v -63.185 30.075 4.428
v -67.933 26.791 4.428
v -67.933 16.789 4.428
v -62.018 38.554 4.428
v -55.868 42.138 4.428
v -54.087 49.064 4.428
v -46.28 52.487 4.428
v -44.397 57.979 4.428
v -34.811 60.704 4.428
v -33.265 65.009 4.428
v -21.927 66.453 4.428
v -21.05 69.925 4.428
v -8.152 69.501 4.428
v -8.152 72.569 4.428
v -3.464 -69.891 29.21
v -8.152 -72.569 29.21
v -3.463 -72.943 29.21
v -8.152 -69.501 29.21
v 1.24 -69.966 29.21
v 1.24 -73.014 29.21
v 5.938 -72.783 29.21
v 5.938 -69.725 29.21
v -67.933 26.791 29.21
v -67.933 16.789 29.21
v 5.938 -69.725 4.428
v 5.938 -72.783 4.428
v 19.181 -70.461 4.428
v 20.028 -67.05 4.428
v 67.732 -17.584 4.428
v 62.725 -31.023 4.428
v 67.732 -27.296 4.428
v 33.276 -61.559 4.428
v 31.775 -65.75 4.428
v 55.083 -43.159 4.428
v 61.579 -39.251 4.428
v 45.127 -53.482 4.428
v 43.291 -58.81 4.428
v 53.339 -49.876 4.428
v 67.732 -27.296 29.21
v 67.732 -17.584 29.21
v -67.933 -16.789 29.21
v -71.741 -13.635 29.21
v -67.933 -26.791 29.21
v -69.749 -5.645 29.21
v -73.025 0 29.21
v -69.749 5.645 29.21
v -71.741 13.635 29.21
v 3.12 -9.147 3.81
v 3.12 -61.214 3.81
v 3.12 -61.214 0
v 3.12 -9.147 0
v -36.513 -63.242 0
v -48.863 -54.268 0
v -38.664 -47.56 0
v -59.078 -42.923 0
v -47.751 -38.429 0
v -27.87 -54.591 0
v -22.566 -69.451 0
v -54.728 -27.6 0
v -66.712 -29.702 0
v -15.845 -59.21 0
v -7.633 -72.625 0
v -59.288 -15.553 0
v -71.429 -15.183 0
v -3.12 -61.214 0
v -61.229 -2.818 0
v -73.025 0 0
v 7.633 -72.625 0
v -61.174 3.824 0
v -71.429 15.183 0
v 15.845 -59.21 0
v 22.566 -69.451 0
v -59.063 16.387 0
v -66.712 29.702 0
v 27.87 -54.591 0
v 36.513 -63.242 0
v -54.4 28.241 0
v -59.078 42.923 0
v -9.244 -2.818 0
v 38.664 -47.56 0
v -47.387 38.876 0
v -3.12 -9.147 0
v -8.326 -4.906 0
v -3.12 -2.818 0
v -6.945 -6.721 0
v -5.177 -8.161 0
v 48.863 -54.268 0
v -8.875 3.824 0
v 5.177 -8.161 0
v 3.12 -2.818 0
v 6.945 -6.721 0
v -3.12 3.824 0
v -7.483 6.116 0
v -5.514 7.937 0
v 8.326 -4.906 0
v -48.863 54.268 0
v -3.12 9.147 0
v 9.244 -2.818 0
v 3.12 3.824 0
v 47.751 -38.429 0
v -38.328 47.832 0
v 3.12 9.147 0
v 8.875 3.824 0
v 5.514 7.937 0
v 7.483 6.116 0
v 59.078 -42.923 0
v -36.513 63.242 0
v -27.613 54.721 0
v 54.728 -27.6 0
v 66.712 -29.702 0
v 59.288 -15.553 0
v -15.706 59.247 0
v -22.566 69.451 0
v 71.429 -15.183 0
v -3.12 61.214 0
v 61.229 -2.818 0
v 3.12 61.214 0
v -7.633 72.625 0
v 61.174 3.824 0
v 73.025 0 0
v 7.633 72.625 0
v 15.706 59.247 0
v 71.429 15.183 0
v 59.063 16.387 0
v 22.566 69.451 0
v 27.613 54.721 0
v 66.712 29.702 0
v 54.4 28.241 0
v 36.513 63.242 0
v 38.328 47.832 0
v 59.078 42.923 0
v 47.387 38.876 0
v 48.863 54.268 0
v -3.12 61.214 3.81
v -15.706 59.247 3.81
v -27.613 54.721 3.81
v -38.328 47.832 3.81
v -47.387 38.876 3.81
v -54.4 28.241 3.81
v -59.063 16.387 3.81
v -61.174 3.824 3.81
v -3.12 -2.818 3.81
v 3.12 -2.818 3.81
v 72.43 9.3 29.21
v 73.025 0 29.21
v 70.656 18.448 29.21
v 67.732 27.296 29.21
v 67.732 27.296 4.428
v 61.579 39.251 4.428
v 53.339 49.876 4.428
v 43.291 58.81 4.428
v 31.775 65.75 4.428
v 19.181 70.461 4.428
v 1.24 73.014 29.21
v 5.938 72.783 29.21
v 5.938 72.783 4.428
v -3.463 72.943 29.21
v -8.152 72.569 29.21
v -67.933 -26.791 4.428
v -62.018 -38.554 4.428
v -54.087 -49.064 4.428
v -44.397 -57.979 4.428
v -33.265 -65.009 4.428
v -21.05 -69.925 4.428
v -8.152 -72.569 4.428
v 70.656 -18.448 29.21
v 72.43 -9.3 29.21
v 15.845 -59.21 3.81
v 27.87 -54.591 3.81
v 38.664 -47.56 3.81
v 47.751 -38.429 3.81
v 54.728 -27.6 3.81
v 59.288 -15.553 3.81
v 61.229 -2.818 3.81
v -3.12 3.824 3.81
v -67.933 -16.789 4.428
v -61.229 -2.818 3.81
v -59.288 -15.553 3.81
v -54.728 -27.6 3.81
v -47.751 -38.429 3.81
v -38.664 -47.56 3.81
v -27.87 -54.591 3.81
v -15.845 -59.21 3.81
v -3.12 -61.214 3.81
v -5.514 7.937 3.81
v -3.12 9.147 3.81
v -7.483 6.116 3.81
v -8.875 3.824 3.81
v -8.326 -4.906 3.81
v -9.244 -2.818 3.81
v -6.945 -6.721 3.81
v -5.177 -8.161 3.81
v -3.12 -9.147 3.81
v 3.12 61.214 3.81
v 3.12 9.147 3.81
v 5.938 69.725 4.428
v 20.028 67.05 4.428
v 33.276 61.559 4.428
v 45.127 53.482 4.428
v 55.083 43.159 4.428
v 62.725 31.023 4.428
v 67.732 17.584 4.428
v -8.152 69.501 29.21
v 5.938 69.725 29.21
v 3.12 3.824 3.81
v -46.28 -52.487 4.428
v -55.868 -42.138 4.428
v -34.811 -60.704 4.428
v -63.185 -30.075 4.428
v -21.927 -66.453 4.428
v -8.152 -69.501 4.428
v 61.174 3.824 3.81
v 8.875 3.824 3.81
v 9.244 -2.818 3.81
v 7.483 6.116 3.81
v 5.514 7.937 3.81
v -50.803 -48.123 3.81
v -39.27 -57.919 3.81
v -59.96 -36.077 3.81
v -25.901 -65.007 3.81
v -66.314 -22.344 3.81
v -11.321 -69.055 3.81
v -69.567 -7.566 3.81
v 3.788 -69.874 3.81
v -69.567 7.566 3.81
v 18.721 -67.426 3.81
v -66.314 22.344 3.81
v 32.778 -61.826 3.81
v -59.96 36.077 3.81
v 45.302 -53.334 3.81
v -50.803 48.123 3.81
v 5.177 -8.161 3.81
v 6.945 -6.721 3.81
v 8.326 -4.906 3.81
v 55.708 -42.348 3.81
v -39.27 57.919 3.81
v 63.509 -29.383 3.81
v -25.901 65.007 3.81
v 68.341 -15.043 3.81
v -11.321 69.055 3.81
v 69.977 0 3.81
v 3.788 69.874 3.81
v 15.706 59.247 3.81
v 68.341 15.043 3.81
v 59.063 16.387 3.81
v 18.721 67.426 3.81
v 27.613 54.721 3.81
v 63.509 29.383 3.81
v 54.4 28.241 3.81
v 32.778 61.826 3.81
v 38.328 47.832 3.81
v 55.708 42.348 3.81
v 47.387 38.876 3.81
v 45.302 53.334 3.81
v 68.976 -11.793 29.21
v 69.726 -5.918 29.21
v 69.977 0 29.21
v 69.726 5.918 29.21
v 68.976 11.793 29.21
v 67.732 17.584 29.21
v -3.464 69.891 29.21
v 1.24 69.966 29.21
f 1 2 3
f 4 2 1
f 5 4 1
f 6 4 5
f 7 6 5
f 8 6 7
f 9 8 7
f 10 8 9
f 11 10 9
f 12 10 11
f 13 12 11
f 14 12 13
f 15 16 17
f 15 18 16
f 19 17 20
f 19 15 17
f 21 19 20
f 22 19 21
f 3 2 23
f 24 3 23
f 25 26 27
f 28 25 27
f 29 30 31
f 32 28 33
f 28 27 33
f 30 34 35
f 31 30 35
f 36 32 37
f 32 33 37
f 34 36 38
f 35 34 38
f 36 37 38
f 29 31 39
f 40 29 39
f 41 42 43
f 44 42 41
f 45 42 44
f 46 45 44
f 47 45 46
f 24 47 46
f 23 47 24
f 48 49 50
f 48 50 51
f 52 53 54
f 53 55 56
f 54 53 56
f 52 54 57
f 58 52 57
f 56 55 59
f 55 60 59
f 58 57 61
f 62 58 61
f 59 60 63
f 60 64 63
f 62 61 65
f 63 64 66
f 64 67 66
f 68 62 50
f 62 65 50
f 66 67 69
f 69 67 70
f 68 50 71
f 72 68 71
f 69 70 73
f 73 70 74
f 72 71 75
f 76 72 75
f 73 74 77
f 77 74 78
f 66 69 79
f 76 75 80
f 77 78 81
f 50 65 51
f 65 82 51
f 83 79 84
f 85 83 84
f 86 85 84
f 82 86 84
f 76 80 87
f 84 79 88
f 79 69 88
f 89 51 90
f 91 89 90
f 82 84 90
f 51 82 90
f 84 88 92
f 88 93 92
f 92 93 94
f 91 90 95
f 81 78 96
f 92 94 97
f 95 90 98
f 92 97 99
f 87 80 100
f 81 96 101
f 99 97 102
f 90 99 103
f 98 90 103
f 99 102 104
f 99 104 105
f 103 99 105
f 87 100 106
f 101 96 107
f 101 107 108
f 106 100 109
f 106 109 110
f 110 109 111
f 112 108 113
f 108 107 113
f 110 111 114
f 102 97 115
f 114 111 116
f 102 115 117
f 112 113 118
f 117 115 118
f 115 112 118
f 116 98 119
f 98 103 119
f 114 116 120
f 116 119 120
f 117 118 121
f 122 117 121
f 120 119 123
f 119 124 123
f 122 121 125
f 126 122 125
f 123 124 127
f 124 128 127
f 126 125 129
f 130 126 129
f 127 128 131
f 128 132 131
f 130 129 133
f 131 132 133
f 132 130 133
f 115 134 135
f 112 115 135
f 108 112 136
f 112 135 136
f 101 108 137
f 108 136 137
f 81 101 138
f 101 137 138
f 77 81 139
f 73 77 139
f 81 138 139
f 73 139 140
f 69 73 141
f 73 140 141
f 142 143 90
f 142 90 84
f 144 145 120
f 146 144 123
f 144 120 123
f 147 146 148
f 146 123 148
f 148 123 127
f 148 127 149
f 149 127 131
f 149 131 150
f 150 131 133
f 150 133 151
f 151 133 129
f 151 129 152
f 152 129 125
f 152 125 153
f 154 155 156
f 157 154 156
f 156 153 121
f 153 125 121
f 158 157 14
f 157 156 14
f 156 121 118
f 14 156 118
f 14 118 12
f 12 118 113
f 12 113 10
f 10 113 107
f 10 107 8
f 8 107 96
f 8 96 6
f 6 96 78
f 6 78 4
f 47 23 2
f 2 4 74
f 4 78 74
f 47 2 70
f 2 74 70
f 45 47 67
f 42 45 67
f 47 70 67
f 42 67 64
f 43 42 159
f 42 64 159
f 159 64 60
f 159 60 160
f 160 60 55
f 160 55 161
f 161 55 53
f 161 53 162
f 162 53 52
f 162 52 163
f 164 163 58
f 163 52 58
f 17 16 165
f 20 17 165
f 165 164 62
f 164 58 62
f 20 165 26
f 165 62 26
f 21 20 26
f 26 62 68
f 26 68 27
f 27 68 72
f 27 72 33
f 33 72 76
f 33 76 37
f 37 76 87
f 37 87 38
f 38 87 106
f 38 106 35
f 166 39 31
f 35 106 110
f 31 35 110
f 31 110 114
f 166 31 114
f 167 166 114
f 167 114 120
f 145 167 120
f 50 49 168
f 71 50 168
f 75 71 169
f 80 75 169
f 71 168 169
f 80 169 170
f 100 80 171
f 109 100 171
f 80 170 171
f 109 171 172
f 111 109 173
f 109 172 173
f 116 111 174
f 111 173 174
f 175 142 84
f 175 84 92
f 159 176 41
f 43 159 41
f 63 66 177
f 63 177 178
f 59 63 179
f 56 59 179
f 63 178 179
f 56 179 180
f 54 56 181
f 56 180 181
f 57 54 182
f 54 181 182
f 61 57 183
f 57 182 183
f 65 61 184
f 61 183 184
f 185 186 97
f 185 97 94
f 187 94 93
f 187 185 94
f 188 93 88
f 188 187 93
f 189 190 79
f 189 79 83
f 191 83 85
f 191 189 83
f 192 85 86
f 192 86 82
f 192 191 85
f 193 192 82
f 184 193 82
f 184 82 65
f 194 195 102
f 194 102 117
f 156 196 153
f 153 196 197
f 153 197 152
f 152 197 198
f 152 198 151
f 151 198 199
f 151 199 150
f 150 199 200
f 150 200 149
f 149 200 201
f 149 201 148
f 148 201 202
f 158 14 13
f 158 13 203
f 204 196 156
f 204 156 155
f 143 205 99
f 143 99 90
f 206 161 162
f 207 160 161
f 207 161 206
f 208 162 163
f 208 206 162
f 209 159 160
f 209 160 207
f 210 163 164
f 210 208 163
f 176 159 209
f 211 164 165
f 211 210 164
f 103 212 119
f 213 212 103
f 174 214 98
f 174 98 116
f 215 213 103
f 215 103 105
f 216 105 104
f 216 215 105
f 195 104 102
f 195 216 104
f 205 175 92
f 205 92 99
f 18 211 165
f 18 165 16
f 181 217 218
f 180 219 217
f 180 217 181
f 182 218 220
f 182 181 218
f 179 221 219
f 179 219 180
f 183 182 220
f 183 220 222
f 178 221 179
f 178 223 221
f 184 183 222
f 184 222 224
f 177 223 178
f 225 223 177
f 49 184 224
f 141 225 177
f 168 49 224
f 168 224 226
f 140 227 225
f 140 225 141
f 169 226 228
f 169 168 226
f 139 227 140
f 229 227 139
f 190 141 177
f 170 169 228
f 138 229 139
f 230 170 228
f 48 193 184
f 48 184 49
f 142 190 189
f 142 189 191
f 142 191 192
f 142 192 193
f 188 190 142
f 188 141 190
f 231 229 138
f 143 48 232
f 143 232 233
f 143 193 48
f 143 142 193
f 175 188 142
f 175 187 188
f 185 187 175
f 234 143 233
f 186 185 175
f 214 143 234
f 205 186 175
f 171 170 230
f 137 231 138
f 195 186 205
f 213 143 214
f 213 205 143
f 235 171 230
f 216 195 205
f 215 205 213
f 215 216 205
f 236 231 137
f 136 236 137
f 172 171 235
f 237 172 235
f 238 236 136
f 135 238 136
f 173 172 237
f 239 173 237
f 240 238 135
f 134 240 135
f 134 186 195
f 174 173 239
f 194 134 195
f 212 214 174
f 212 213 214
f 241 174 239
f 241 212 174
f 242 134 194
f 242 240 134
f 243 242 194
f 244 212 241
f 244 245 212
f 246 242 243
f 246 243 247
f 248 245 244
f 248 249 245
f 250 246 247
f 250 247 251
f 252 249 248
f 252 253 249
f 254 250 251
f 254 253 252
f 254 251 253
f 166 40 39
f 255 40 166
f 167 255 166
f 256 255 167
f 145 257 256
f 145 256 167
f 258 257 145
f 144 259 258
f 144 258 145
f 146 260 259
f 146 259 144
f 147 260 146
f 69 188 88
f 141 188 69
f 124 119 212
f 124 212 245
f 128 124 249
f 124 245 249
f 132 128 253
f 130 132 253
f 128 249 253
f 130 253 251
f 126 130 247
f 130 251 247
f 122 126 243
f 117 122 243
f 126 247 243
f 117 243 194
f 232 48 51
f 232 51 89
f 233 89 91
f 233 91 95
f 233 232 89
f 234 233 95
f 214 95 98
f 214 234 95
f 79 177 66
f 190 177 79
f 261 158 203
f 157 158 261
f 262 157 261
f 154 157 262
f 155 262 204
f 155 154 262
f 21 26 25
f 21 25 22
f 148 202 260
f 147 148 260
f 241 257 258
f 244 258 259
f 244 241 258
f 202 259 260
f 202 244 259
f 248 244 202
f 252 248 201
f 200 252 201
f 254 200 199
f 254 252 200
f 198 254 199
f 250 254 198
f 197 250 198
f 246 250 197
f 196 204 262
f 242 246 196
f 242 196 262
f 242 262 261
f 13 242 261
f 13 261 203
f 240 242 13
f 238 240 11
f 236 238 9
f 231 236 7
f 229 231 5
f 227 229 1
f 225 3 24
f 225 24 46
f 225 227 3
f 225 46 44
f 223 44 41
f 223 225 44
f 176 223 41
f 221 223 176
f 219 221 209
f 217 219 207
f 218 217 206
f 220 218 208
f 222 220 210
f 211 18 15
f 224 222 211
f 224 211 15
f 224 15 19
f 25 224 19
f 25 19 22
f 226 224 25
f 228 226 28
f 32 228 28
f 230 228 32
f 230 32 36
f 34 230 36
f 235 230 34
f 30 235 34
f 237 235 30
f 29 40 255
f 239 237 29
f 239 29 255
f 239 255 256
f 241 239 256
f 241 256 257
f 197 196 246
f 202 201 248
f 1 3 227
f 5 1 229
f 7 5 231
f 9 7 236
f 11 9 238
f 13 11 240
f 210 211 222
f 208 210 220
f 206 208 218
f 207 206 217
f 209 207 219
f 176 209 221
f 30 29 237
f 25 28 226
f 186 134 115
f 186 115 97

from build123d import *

# Parameters (mm, degrees)
F0_R     = 73.025
F1_DEPTH = 3.81
F2_R     = 73.025
F2_R_2   = 69.977
F3_DEPTH = 25.4
F4_R     = 61.2936559159
F5_DEPTH = 25.4
F7_DEPTH = 3.81
F8_W     = 59.7810531035
F8_H     = 29.3873213232
F8_W_2   = 61.7938893847
F9_DEPTH = 127


with BuildPart() as f1:
    # F0 (on Top) → F1 (new body)
    with BuildSketch(Plane.XY):
        Circle(F0_R)
    extrude(amount=F1_DEPTH)

    # F2 (on face) → F3 (join)
    with BuildSketch(Plane.XY.offset(3.81)):
        Circle(F2_R)
        Circle(F2_R_2, mode=Mode.SUBTRACT)
    extrude(amount=F3_DEPTH)

    # F4 (on face) → F5 (cut)
    with BuildSketch(Plane.XY.offset(3.81)):
        Circle(F4_R)
    extrude(amount=-F5_DEPTH, mode=Mode.SUBTRACT)

    # F6 (on face) → F7 (join, through all)
    with BuildSketch(Plane.XY.offset(3.81)):
        with BuildLine():
            Line((3.1198861543, 65.2156993747), (-3.1198873185, 65.2156993747))
            Line((-3.1198873185, 65.2156993747), (-3.1198873185, 9.1467575412))
            ThreePointArc((-3.1198873185, 9.1467575412), (-6.15e-07, 9.6642056268), (3.1198861543, 9.1467579383))
            Line((3.1198861543, 9.1467579383), (3.1198861543, 65.2156993747))
        make_face()
        with BuildLine():
            ThreePointArc((3.1198861543, 9.1467579383), (-6.15e-07, 9.6642056268), (-3.1198873185, 9.1467575412))
            Line((-3.1198873185, 9.1467575412), (-3.1198873185, 3.8243774325))
            Line((-3.1198873185, 3.8243774325), (3.1198861543, 3.8243774325))
            Line((3.1198861543, 3.8243774325), (3.1198861543, 9.1467579383))
        make_face()
        with BuildLine():
            Line((-3.1198873185, 3.8243774325), (-3.1198873185, 9.1467575412))
            ThreePointArc((-3.1198873185, 9.1467575412), (-6.5614847143, 7.0953357033), (-8.8753032428, 3.8243774325))
            Line((-8.8753032428, 3.8243774325), (-3.1198873185, 3.8243774325))
        make_face()
        with BuildLine():
            ThreePointArc((8.8753032428, 3.8243774325), (6.5614842628, 7.0953361208), (3.1198861543, 9.1467579383))
            Line((3.1198861543, 9.1467579383), (3.1198861543, 3.8243774325))
            Line((3.1198861543, 3.8243774325), (8.8753032428, 3.8243774325))
        make_face()
        with BuildLine():
            Line((-3.1198873185, -2.8179625515), (-3.1198873185, 3.8243774325))
            Line((-3.1198873185, 3.8243774325), (-8.8753032428, 3.8243774325))
            ThreePointArc((-8.8753032428, 3.8243774325), (-9.6493328393, 0.5359534999), (-9.2442391497, -2.8179625515))
            Line((-9.2442391497, -2.8179625515), (-3.1198873185, -2.8179625515))
        make_face()
        with BuildLine():
            ThreePointArc((-9.2442391497, -2.8179625515), (-9.6493328393, 0.5359534999), (-8.8753032428, 3.8243774325))
            Line((-8.8753032428, 3.8243774325), (-63.3035078645, 3.8243774325))
            Line((-63.3035078645, 3.8243774325), (-63.3035078645, -2.8179625515))
            Line((-63.3035078645, -2.8179625515), (-9.2442391497, -2.8179625515))
        make_face()
        with BuildLine():
            Line((8.8753032428, 3.8243774325), (3.1198861543, 3.8243774325))
            Line((3.1198861543, 3.8243774325), (3.1198861543, -2.8179625515))
            Line((3.1198861543, -2.8179625515), (9.2442391497, -2.8179625515))
            ThreePointArc((9.2442391497, -2.8179625515), (9.5586374134, -1.4245424514), (9.6642056268, 0))
            ThreePointArc((9.6642056268, 0), (9.4649254074, 1.952449085), (8.8753032428, 3.8243774325))
        make_face()
        with BuildLine():
            Line((64.1086399555, 3.8243774325), (8.8753032428, 3.8243774325))
            ThreePointArc((8.8753032428, 3.8243774325), (9.4649254074, 1.952449085), (9.6642056268, 0))
            ThreePointArc((9.6642056268, 0), (9.5586374134, -1.4245424514), (9.2442391497, -2.8179625515))
            Line((9.2442391497, -2.8179625515), (64.1086399555, -2.8179625515))
            Line((64.1086399555, -2.8179625515), (64.1086399555, 3.8243774325))
        make_face()
        with BuildLine():
            Line((3.1198861543, -2.8179625515), (-3.1198873185, -2.8179625515))
            Line((-3.1198873185, -2.8179625515), (-3.1198873185, -9.1467575412))
            ThreePointArc((-3.1198873185, -9.1467575412), (-6.15e-07, -9.6642056268), (3.1198861543, -9.1467579383))
            Line((3.1198861543, -9.1467579383), (3.1198861543, -2.8179625515))
        make_face()
        with BuildLine():
            Line((-3.1198873185, -9.1467575412), (-3.1198873185, -2.8179625515))
            Line((-3.1198873185, -2.8179625515), (-9.2442391497, -2.8179625515))
            ThreePointArc((-9.2442391497, -2.8179625515), (-6.9448770569, -6.7205322008), (-3.1198873185, -9.1467575412))
        make_face()
        with BuildLine():
            Line((9.2442391497, -2.8179625515), (3.1198861543, -2.8179625515))
            Line((3.1198861543, -2.8179625515), (3.1198861543, -9.1467579383))
            ThreePointArc((3.1198861543, -9.1467579383), (6.9448766292, -6.7205326428), (9.2442391497, -2.8179625515))
        make_face()
        with BuildLine():
            ThreePointArc((3.1198861543, -9.1467579383), (-6.15e-07, -9.6642056268), (-3.1198873185, -9.1467575412))
            Line((-3.1198873185, -9.1467575412), (-3.1198873185, -64.2092823982))
            Line((-3.1198873185, -64.2092823982), (3.1198861543, -64.2092823982))
            Line((3.1198861543, -64.2092823982), (3.1198861543, -9.1467579383))
        make_face()
    extrude(amount=-F7_DEPTH)

    # F8 (on Front) → F9 (cut, symmetric)
    with BuildSketch(Plane.XZ):
        with Locations((-38.0424889736, 19.1218871623)):
            Rectangle(F8_W, F8_H)
        with Locations((36.8347933982, 19.1218871623)):
            Rectangle(F8_W_2, F8_H)
    extrude(amount=F9_DEPTH, both=True, mode=Mode.SUBTRACT)


solid = f1.part
